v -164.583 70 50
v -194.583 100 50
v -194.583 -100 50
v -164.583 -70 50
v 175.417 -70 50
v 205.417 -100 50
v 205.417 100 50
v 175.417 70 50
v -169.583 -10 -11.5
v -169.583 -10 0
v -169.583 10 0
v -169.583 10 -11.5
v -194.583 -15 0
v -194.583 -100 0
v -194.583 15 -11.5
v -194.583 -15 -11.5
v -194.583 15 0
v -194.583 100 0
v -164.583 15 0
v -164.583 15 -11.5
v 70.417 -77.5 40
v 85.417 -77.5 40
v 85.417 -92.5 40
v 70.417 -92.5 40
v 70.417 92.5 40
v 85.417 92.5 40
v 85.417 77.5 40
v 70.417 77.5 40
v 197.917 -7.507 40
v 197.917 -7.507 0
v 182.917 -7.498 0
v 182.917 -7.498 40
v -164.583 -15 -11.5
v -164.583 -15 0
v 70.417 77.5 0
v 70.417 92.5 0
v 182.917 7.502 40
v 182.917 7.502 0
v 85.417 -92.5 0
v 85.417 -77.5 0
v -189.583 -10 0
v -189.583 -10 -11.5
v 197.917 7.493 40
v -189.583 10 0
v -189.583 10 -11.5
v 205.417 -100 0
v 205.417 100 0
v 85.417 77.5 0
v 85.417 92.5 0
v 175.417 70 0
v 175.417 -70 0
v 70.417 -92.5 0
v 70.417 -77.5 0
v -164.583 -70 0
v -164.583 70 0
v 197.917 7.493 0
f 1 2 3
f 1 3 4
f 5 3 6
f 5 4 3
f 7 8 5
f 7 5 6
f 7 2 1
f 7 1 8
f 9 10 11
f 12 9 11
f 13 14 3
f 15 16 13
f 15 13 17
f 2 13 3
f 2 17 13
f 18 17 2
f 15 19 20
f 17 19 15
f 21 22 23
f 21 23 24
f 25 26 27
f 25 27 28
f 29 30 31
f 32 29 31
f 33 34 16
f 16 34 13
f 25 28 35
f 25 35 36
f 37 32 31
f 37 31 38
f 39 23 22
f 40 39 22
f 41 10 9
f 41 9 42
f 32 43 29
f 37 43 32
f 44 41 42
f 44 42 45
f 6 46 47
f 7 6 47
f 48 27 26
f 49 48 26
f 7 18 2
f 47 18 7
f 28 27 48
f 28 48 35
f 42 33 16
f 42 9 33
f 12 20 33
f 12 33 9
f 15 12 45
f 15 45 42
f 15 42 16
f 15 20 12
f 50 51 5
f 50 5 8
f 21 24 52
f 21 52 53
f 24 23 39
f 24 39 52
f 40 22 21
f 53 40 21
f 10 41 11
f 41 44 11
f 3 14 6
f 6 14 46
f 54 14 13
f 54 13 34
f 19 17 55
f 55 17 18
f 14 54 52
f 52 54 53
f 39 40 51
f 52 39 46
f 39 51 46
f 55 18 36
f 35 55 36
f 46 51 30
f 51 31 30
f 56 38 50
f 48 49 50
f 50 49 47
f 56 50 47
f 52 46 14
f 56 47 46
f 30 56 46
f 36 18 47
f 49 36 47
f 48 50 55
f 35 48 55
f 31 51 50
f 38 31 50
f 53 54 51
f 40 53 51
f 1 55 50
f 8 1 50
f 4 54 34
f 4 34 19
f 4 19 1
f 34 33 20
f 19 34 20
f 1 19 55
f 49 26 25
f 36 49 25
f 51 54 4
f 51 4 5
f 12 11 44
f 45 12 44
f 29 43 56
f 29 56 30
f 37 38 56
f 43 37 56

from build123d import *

# Parameters (mm, degrees)
SKETCH1_W           = 400
SKETCH1_H           = 200
SKETCH1_W_2         = 340
SKETCH1_H_2         = 140
BOSS_EXTRUDE1_DEPTH = 50
SKETCH2_W           = 15
SKETCH2_H           = 15
CUT_EXTRUDE1_DEPTH  = 40
SKETCH3_W           = 30
SKETCH3_H           = 30
SKETCH3_W_2         = 20
SKETCH3_H_2         = 20
BOSS_EXTRUDE2_DEPTH = 11.5


with BuildPart() as part:
    # Sketch1 → Boss-Extrude1 (new body)
    with BuildSketch(Plane.XY):
        with Locations((5.416666667, 0)):
            Rectangle(SKETCH1_W, SKETCH1_H)
        with Locations((5.416666667, 0)):
            Rectangle(SKETCH1_W_2, SKETCH1_H_2, mode=Mode.SUBTRACT)
    extrude(amount=BOSS_EXTRUDE1_DEPTH)

    # Sketch2 → Cut-Extrude1 (cut)
    with BuildSketch(Plane(origin=(0, 0, 0), x_dir=(-1, 0, 0), z_dir=(0, 0, -1))):
        with Locations((-77.916666667, 85)):
            Rectangle(SKETCH2_W, SKETCH2_H)
        with Locations((-77.916666667, -85)):
            Rectangle(SKETCH2_W, SKETCH2_H)
        Polygon((-197.916664047, 7.493396785), (-197.916664047, -7.506603215), (-182.916666667, -7.497737374), (-182.916666667, 7.502262626), align=None)
    extrude(amount=-CUT_EXTRUDE1_DEPTH, mode=Mode.SUBTRACT)

    # Sketch3 → Boss-Extrude2 (add)
    with BuildSketch(Plane(origin=(0, 0, 0), x_dir=(-1, 0, 0), z_dir=(0, 0, -1))):
        with Locations((179.583333333, 0)):
            Rectangle(SKETCH3_W, SKETCH3_H)
        with Locations((179.583333333, 0)):
            Rectangle(SKETCH3_W_2, SKETCH3_H_2, mode=Mode.SUBTRACT)
    extrude(amount=BOSS_EXTRUDE2_DEPTH)


solid = part.part
